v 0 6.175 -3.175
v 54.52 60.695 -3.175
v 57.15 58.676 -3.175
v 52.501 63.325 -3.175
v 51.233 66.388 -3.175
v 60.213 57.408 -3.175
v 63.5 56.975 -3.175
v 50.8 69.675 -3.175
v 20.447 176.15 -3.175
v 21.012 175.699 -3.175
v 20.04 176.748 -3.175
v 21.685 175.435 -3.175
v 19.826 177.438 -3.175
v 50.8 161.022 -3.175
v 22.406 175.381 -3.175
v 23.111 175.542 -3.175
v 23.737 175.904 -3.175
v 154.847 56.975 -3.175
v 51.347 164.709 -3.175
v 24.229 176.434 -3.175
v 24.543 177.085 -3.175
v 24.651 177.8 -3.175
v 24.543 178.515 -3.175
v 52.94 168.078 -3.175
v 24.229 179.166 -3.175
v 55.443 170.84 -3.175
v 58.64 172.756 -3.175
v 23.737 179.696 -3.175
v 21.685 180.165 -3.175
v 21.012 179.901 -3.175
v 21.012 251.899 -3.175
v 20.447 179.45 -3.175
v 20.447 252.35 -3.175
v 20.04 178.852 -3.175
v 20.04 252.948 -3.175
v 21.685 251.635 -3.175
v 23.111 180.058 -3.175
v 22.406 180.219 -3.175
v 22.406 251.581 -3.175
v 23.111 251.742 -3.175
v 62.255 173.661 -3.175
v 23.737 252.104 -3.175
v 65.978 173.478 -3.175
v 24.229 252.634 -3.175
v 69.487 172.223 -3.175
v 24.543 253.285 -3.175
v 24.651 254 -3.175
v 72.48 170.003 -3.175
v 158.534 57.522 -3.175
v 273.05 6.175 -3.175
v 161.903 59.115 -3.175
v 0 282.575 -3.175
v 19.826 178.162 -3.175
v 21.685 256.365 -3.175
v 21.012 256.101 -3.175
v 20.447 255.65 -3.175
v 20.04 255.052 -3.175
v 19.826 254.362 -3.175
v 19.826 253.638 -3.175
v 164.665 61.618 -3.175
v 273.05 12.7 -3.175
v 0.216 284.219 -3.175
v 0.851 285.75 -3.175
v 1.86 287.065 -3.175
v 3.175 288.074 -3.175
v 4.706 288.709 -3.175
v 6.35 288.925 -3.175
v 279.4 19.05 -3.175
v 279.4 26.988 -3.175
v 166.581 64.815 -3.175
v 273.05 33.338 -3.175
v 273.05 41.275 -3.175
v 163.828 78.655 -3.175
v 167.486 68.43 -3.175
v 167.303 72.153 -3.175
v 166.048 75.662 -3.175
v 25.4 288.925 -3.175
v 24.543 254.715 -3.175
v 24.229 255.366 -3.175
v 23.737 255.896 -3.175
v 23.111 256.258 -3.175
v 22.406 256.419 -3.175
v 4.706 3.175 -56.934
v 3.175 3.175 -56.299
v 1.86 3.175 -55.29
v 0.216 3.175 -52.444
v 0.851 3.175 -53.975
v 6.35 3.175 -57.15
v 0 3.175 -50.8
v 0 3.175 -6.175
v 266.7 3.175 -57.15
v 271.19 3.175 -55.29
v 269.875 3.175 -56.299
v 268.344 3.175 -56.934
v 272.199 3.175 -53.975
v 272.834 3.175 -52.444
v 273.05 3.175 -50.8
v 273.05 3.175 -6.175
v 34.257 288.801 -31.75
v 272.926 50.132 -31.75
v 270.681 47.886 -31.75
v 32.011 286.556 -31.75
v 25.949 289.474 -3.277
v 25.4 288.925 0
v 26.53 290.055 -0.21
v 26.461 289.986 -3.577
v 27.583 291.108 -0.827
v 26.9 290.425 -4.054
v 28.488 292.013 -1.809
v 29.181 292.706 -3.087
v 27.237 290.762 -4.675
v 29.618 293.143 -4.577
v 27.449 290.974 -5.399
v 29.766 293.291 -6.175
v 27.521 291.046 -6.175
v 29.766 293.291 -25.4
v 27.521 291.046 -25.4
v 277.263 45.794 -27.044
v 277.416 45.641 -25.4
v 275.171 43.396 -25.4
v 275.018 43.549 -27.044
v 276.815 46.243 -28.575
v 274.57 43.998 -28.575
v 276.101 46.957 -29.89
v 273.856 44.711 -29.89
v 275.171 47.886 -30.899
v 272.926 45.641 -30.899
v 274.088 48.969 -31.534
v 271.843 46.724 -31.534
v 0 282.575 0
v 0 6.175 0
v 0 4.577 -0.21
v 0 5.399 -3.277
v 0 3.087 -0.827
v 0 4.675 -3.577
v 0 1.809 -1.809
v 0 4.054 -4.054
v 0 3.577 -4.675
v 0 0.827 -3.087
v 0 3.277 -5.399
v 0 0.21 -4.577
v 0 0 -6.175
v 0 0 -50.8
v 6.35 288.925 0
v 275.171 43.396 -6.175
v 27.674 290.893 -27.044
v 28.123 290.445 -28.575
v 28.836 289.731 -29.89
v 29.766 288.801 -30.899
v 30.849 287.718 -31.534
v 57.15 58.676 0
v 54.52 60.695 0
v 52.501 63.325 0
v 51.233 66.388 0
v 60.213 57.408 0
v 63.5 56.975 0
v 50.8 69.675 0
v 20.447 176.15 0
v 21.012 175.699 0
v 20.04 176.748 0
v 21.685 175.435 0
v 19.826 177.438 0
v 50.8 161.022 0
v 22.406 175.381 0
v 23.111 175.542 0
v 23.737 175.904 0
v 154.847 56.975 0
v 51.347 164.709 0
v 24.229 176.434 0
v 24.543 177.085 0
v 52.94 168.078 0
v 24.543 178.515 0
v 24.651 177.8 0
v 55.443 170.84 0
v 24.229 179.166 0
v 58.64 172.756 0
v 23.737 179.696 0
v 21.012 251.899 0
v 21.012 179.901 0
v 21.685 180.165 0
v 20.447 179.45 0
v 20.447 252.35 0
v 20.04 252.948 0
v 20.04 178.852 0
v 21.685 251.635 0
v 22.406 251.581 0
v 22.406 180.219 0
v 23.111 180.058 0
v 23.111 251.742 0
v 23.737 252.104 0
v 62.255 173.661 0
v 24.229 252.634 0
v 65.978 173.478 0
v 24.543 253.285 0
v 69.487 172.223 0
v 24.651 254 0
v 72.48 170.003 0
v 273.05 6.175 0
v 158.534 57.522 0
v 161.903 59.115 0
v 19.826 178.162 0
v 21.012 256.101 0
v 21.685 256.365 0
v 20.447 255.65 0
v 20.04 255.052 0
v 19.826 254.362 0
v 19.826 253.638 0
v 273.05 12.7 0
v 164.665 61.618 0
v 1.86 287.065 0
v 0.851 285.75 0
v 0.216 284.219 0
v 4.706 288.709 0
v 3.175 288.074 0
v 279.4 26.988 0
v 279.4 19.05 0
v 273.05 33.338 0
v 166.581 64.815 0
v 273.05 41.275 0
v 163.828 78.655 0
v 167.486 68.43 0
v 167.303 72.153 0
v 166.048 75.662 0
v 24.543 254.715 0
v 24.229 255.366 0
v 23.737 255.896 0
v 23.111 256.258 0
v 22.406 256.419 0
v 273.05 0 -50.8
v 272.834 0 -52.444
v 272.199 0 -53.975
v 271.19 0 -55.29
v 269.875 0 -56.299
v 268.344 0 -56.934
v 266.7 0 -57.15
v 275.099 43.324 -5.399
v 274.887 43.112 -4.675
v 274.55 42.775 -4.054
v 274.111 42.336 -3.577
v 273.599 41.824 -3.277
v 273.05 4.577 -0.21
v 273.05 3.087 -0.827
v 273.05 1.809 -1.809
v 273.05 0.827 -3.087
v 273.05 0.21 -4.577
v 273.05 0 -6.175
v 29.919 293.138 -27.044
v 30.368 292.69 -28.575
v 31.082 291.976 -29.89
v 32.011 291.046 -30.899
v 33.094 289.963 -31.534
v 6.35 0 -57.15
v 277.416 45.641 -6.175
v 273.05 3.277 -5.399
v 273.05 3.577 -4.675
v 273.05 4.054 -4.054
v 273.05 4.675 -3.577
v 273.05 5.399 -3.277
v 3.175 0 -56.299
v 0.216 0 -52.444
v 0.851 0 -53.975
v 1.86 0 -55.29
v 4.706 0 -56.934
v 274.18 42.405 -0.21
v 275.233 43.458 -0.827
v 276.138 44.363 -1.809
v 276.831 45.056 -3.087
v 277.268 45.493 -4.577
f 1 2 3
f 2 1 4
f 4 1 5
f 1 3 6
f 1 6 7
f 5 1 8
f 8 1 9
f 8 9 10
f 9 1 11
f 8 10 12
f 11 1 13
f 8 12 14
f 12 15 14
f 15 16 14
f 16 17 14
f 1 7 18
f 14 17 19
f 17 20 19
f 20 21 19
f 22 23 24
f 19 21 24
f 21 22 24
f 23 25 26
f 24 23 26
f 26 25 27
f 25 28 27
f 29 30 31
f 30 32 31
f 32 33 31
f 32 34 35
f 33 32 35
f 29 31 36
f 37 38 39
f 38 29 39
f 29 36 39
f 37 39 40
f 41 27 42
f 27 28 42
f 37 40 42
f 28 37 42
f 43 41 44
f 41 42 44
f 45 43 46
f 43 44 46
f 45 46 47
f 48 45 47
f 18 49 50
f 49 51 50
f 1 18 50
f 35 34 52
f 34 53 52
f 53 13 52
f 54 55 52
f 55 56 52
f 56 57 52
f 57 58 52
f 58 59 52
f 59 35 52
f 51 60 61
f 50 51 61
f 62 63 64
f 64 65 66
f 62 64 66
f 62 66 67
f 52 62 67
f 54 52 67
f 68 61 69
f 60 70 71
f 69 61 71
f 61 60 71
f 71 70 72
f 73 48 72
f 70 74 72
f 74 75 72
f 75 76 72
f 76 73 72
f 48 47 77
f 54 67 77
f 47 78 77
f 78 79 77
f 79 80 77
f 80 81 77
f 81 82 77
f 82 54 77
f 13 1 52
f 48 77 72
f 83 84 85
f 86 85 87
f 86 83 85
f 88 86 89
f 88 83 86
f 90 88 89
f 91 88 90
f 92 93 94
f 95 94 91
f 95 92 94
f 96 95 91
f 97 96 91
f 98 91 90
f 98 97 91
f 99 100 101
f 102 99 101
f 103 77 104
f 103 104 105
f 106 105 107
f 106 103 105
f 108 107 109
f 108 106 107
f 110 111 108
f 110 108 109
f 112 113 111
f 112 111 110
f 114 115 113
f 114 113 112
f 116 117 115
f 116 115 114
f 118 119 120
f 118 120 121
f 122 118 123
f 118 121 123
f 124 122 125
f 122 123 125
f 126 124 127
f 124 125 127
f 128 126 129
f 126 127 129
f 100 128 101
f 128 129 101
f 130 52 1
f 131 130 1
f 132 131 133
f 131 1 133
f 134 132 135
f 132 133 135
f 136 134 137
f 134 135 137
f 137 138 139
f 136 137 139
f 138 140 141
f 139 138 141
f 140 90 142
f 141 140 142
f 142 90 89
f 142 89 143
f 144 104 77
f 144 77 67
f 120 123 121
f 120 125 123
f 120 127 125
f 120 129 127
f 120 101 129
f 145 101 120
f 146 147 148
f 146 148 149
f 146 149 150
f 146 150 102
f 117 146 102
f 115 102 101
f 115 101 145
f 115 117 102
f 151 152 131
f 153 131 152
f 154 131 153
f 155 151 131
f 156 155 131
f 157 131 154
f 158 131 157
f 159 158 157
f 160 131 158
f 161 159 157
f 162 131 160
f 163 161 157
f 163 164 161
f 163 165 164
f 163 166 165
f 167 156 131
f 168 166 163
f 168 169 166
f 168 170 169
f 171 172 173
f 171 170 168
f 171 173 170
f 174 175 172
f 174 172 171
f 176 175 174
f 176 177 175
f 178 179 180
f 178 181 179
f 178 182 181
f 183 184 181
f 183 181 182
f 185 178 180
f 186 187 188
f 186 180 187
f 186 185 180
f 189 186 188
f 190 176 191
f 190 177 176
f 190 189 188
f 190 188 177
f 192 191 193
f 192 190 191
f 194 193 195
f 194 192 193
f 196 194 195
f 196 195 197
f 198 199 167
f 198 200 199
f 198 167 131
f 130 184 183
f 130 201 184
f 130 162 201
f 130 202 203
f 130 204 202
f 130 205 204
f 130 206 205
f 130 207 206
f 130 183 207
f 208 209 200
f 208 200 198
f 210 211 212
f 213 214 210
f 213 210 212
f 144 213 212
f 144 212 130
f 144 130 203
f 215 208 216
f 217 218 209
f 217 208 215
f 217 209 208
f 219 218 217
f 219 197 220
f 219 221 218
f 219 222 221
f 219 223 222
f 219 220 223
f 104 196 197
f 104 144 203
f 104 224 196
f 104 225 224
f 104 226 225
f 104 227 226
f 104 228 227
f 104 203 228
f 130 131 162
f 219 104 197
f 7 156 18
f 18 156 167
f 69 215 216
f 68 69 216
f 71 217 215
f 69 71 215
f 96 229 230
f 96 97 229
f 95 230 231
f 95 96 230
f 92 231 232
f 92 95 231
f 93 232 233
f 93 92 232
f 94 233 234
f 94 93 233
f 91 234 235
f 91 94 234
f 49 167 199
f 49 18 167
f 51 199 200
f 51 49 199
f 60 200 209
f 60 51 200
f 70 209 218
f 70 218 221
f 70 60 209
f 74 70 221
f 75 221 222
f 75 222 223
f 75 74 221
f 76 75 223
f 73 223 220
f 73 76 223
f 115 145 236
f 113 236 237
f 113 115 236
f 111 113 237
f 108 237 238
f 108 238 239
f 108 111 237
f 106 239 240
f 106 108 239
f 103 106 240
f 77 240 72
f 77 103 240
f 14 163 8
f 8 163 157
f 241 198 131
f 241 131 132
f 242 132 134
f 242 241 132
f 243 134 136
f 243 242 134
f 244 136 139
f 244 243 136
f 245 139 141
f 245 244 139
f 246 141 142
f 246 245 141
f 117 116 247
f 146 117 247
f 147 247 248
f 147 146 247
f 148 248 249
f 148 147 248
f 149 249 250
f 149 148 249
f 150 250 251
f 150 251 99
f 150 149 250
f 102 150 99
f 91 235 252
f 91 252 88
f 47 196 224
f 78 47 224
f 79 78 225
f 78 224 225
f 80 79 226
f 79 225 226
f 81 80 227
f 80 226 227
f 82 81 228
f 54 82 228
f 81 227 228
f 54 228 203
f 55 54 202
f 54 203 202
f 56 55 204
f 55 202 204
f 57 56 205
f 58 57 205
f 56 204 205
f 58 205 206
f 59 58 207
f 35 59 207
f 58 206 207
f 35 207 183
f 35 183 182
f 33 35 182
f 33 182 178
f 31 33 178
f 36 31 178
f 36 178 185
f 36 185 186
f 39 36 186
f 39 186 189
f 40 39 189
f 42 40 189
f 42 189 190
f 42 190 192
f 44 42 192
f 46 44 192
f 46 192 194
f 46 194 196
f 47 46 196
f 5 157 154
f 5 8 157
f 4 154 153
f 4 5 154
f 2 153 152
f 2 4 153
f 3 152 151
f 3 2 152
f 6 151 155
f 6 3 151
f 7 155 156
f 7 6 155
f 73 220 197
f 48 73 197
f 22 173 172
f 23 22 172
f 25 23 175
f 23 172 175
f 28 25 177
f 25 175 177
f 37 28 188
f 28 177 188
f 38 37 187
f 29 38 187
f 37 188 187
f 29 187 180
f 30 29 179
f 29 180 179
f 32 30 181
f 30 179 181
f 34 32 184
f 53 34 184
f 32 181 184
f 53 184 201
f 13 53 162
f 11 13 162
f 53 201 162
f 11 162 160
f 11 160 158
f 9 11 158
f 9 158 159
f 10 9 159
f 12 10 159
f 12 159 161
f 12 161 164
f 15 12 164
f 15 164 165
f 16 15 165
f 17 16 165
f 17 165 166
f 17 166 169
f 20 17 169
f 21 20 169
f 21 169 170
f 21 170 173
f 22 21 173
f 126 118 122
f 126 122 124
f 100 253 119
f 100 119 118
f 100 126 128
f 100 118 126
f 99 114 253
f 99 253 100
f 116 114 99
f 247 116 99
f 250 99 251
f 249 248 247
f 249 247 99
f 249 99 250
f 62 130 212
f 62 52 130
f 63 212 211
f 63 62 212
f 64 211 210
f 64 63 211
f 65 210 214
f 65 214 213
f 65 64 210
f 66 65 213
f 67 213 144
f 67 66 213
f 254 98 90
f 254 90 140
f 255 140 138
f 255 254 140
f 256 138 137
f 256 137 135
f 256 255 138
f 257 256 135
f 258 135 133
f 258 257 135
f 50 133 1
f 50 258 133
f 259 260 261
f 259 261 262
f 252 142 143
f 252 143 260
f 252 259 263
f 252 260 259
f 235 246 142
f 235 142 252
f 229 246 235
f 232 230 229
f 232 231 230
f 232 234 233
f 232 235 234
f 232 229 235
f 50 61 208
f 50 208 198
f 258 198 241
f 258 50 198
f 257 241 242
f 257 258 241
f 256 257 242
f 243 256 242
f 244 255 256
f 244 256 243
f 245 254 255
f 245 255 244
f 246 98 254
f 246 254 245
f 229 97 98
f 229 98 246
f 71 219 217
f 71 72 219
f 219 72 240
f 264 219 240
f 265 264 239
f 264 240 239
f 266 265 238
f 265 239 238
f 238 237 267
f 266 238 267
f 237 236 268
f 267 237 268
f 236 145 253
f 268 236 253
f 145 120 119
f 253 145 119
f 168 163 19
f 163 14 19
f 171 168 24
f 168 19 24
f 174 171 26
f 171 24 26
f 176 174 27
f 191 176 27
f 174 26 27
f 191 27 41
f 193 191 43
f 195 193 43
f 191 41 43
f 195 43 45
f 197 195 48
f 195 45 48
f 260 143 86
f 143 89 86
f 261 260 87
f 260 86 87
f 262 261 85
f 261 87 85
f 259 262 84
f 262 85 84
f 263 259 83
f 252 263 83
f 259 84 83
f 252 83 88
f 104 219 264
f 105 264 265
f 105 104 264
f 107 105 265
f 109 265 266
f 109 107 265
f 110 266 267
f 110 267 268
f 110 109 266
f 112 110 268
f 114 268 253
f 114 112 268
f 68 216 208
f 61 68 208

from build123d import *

# Parameters (mm, degrees)
BASE_FLANGE1_DEPTH           = 3.175
EDGE_FLANGE1_DEPTH           = 350.229988722
EDGE_FLANGE2_STRIP_W         = 18.7
EDGE_FLANGE2_STRIP_H         = 3.175
EDGE_FLANGE2_STRIP_CUT_DEPTH = 273.05
EDGE_FLANGE2_DEPTH           = 273.05
CUT_EXTRUDE1_DEPTH           = 408.732521351
FILLET1_R                    = 12.7
F_11_0_191_DIAMETER_HOLE1_D  = 4.8514
BOSS_EXTRUDE1_DEPTH          = 3.175
FILLET2_R                    = 6.35


# Sheet-metal steps are written as plain solids
with BuildPart() as part:
    # Sketch1 → Base-Flange1 (new body)
    with BuildSketch(Plane.XY):
        Polygon((0, 0), (273.05, 0), (273.05, 41.275), (25.4, 288.925), (0, 288.925), align=None)
    extrude(amount=-BASE_FLANGE1_DEPTH)

    # Edge-Flange1 section (across the edge) → Edge-Flange1 (add)
    with BuildSketch(Plane(origin=(27.521320344, 291.046320344, -3.175), x_dir=(-0.7071067811865436, -0.7071067811865516, -3.4914813388431334e-15), z_dir=(0.7071067811865516, -0.7071067811865436, 0))):
        with BuildLine():
            Line((-3.175, 3), (-3.175, 28.575))
            Line((-3.175, 28.575), (0, 28.575))
            Line((0, 28.575), (0, 3))
            ThreePointArc((0, 3), (0.878679656, 0.878679656), (3, 0))
            Line((3, 0), (3, -3.175))
            ThreePointArc((3, -3.175), (-1.366384374, -1.366384374), (-3.175, 3))
        make_face()
    extrude(amount=EDGE_FLANGE1_DEPTH)

    # Edge-Flange2 strip (across the edge) → Edge-Flange2 strip cut (cut)
    with BuildSketch(Plane(origin=(273.05, 0, -3.175), x_dir=(0, 1, 0), z_dir=(-1, 0, 0))):
        with Locations((-3.175, -1.5875)):
            Rectangle(EDGE_FLANGE2_STRIP_W, EDGE_FLANGE2_STRIP_H)
    extrude(amount=EDGE_FLANGE2_STRIP_CUT_DEPTH, mode=Mode.SUBTRACT)

    # Edge-Flange2 section (across the edge) → Edge-Flange2 (add)
    with BuildSketch(Plane(origin=(273.05, 0, -3.175), x_dir=(0, 1, 0), z_dir=(-1, 0, 0))):
        with BuildLine():
            Line((0, 3), (0, 53.975))
            Line((0, 53.975), (3.175, 53.975))
            Line((3.175, 53.975), (3.175, 3))
            ThreePointArc((3.175, 3), (4.053679656, 0.878679656), (6.175, 0))
            Line((6.175, 0), (6.175, -3.175))
            ThreePointArc((6.175, -3.175), (1.808615626, -1.366384374), (0, 3))
        make_face()
    extrude(amount=EDGE_FLANGE2_DEPTH)

    # Sketch12 → Cut-Extrude1 (cut, through all)
    with BuildSketch(Plane.XY):
        Polygon((50.8, 191.682951031), (50.8, 56.975), (185.507951031, 56.975), align=None)
    extrude(amount=-CUT_EXTRUDE1_DEPTH, mode=Mode.SUBTRACT)

    # Fillet1
    fillet1_edges = [part.edges().sort_by_distance(p)[0] for p in [
        (185.507951031, 56.975, -1.5875),
        (50.8, 56.975, -1.5875),
        (50.8, 191.682951031, -1.5875),
    ]]
    fillet(fillet1_edges, radius=FILLET1_R)

    # #11 (0.191) Diameter Hole1 (through all)
    with Locations(Plane(origin=(0, 0, -3.175), x_dir=(-1, 0, 0), z_dir=(0, 0, -1))):
        with Locations((-22.225, 254), (-22.225, 177.8)):
            Hole(F_11_0_191_DIAMETER_HOLE1_D / 2)

    # Sketch15 → Boss-Extrude1 (add)
    with BuildSketch(Plane.XY):
        Polygon((273.05, 33.3375), (279.4, 26.9875), (279.4, 19.05), (273.05, 12.7), align=None)
    extrude(amount=-BOSS_EXTRUDE1_DEPTH)

    # Fillet2
    fillet2_edges = [part.edges().sort_by_distance(p)[0] for p in [
        (28.643852359, 292.168852359, -31.75),
        (276.293852359, 44.518852359, -31.75),
        (273.05, 1.5875, -57.15),
        (0, 1.5875, -57.15),
        (0, 288.925, -1.5875),
    ]]
    fillet(fillet2_edges, radius=FILLET2_R)


solid = part.part
